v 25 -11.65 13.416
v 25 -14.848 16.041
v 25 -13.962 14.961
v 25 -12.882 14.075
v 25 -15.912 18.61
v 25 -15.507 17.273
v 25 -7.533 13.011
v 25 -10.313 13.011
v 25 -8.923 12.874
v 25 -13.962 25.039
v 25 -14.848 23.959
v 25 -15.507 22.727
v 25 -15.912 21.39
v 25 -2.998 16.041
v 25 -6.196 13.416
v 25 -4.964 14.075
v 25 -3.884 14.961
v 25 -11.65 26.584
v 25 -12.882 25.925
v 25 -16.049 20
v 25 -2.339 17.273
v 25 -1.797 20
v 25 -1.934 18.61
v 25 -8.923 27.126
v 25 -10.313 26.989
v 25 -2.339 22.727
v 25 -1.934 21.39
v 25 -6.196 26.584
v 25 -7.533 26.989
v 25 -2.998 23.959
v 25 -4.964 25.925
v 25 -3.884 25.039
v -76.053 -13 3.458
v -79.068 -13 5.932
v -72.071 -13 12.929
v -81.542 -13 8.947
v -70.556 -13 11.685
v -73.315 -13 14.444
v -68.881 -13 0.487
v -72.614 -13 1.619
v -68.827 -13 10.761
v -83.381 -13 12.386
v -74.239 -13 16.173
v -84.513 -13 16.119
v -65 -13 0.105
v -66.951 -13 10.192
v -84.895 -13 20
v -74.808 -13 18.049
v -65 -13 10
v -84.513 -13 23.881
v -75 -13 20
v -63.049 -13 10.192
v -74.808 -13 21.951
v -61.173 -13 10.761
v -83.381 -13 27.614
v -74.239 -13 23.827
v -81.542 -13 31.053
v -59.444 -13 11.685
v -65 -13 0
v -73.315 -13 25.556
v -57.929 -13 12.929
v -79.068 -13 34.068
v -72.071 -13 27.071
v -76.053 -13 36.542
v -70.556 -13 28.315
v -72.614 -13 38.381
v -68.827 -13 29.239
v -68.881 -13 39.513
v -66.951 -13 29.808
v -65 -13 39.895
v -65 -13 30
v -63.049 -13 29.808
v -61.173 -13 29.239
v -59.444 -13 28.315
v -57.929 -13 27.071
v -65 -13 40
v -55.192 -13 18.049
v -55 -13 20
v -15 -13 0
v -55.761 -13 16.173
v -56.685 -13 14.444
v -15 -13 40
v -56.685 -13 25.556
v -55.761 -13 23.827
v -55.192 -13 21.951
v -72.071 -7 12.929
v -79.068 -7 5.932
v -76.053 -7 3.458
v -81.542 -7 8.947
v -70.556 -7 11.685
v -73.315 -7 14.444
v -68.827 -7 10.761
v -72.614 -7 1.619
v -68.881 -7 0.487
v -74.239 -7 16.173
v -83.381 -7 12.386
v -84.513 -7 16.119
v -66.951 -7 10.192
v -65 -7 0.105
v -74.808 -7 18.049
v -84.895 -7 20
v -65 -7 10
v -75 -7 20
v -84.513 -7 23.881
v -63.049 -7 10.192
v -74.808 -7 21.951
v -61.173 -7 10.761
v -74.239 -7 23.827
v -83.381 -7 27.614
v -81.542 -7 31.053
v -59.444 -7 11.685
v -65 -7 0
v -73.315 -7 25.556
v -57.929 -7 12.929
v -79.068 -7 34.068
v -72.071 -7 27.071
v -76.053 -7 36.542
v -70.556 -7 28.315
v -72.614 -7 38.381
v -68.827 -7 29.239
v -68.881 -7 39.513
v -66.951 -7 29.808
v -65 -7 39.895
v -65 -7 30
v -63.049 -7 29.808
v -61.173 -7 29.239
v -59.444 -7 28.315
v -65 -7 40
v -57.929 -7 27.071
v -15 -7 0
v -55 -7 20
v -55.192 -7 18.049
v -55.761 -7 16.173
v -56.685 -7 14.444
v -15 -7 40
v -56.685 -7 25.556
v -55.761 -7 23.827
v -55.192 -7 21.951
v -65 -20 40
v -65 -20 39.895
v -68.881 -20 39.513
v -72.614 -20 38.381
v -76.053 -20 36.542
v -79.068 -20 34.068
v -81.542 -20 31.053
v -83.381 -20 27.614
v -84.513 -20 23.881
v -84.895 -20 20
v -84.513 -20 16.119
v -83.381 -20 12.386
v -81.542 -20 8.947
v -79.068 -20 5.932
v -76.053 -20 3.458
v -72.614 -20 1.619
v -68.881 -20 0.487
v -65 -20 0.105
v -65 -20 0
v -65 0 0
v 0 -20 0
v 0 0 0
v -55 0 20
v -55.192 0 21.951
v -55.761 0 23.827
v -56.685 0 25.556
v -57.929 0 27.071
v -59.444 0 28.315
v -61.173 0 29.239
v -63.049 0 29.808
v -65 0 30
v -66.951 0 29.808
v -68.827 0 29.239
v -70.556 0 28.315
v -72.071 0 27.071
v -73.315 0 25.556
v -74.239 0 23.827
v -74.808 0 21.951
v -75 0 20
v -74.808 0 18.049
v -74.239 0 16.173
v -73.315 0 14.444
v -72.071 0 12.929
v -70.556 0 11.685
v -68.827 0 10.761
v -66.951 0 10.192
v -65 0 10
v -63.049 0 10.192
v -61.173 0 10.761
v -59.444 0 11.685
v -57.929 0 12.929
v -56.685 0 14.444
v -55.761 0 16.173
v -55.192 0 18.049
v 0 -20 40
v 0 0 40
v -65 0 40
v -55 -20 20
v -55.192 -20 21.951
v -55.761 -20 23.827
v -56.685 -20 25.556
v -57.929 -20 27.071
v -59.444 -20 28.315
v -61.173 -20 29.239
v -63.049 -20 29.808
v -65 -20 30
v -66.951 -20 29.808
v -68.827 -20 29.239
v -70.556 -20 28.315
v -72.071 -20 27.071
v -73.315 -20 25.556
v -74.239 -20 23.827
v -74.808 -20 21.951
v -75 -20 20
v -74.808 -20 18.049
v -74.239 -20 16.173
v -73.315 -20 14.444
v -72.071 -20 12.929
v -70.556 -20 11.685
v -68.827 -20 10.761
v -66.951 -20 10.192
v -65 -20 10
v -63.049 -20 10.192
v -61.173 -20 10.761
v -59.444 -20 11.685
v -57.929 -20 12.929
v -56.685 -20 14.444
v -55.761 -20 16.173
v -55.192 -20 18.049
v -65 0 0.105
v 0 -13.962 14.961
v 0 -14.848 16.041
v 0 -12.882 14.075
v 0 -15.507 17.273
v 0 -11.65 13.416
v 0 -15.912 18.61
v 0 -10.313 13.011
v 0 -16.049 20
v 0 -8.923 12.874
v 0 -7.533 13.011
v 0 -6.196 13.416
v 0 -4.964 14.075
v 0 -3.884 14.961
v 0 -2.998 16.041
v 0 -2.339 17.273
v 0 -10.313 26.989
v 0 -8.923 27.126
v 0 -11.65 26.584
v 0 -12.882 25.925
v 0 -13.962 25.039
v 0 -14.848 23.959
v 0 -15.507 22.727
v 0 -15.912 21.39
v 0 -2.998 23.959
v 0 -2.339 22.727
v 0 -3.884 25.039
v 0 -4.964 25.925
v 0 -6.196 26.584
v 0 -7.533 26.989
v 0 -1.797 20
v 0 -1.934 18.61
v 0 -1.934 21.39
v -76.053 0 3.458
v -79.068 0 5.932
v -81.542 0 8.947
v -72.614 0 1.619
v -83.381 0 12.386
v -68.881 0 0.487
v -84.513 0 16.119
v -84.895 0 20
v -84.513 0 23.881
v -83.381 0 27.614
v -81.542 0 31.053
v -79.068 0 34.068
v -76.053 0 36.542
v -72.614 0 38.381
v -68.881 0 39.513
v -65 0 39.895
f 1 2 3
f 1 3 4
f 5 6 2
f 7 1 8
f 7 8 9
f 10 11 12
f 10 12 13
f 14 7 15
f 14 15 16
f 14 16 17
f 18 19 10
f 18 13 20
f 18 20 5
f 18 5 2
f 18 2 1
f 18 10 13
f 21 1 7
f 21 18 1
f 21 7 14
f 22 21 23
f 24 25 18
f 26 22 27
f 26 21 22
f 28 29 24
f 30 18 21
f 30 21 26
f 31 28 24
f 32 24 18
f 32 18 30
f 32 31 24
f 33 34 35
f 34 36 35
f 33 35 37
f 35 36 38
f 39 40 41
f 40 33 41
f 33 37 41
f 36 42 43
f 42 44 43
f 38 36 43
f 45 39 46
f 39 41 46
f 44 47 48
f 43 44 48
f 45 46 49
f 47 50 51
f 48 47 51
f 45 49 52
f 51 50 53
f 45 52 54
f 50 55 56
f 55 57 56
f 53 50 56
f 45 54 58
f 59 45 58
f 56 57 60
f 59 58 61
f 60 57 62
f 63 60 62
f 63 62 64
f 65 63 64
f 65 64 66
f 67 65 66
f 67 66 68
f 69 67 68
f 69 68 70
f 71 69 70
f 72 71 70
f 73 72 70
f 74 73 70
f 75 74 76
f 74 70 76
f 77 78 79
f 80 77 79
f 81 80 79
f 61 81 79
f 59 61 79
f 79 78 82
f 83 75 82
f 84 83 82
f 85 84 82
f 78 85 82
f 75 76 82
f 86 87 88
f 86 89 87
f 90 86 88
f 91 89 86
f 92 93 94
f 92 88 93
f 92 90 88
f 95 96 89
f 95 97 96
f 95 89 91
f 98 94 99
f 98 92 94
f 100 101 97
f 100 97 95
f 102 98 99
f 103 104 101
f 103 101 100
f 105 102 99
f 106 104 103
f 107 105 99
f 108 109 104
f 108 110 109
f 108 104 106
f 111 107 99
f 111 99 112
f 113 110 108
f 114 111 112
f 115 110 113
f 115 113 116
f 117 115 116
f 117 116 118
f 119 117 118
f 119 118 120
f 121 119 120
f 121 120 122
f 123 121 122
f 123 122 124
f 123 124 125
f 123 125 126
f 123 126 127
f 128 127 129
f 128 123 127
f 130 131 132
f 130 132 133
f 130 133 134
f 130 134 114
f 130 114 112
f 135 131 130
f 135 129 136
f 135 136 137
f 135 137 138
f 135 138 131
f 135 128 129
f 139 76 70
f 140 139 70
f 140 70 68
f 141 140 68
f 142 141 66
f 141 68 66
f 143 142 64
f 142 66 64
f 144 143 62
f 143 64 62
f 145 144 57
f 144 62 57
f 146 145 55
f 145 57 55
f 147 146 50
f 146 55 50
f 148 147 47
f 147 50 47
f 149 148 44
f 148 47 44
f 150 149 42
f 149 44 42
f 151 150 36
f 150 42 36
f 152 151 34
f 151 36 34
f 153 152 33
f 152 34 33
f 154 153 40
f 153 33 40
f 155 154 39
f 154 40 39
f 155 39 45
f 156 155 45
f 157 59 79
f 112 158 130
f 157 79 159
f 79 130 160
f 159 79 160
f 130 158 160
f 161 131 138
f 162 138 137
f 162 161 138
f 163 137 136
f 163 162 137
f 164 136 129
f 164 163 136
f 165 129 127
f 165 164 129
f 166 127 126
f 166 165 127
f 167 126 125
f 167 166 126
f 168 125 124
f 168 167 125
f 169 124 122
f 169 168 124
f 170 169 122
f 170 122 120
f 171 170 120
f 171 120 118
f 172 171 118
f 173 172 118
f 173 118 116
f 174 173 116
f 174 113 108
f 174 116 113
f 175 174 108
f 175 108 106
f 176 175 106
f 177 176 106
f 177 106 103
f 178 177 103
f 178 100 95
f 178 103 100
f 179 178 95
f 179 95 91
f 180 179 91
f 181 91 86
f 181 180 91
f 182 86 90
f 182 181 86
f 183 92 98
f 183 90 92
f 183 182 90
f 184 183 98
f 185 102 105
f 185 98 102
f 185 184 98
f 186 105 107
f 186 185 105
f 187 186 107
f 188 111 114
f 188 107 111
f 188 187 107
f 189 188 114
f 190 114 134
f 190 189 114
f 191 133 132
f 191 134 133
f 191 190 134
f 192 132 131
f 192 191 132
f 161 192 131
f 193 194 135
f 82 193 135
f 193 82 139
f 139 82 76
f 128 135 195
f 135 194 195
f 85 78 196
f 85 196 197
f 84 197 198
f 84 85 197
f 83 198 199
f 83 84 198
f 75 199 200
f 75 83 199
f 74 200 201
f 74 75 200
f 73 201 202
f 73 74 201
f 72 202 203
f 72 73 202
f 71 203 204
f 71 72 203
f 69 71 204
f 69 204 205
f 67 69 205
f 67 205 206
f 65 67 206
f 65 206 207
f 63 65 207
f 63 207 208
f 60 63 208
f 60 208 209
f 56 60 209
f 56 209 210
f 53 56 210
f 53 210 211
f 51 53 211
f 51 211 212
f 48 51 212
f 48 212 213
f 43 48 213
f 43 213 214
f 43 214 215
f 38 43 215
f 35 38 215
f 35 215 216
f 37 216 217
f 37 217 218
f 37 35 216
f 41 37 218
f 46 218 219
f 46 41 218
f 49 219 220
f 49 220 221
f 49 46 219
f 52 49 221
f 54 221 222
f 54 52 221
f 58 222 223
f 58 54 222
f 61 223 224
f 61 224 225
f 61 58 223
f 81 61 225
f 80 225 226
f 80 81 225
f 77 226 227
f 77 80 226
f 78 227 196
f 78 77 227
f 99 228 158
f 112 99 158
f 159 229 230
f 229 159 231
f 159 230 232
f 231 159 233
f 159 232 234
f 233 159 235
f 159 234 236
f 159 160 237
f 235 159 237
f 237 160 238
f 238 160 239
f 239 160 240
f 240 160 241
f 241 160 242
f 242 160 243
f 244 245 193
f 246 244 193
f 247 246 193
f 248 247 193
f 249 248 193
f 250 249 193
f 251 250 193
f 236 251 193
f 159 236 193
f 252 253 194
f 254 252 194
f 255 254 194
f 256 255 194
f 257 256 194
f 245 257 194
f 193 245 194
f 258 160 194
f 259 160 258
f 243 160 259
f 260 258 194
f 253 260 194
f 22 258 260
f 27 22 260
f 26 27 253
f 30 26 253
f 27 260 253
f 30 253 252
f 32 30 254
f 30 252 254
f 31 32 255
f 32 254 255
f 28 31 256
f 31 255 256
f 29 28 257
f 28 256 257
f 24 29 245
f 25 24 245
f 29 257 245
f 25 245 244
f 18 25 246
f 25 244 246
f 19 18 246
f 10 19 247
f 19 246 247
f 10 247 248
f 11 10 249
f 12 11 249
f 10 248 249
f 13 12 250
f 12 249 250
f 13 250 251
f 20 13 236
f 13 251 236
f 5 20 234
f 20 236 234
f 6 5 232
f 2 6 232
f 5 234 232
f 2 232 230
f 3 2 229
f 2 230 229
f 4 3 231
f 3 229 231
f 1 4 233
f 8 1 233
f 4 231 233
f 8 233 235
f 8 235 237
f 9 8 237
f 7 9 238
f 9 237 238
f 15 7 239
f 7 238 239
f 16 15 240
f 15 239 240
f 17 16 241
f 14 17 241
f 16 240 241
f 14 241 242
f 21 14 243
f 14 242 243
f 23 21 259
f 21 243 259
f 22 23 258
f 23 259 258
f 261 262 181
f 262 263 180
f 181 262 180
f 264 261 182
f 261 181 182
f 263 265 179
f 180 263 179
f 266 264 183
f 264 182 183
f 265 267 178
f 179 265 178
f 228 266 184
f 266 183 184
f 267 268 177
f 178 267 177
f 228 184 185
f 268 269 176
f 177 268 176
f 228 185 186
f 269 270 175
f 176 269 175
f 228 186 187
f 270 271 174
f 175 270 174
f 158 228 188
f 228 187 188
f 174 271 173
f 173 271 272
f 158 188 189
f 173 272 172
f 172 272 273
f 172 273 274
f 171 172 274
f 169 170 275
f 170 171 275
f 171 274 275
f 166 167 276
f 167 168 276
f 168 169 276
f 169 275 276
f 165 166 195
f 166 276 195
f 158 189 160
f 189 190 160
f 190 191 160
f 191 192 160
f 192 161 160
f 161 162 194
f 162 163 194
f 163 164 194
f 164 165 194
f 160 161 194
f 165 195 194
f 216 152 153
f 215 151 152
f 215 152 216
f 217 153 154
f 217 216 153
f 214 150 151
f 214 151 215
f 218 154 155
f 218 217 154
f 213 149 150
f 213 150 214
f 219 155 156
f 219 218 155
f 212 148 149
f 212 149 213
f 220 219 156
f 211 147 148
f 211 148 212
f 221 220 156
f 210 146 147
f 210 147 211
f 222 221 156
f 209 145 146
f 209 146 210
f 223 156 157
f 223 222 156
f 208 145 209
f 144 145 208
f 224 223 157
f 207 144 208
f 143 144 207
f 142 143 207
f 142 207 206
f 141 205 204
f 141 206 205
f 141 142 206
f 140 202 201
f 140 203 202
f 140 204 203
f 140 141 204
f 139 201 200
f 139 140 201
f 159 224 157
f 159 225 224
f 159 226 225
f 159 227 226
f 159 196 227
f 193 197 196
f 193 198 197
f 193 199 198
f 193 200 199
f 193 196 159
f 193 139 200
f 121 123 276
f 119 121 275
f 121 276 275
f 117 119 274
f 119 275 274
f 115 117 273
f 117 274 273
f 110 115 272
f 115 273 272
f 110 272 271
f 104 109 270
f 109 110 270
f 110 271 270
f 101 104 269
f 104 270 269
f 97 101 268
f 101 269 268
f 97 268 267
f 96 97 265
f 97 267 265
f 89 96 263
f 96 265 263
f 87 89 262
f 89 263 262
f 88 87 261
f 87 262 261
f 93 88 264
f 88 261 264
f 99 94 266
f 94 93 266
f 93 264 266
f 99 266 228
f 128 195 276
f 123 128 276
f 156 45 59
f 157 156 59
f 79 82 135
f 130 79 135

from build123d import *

# Parameters (mm, degrees)
F0_R     = 10
F1_DEPTH = 20
F2_W     = 74.504801
F2_H     = 6
F3_DEPTH = 40
F4_R     = 7.126224
F5_DEPTH = 25


with BuildPart() as f1:
    # F0 (on Front) → F1 (new body)
    with BuildSketch(Plane.XZ):
        with BuildLine():
            Line((-65, 0), (0, 0))
            Line((0, 0), (0, 40))
            Line((0, 40), (-65, 40))
            Line((-65, 40), (-65, 39.89539))
            ThreePointArc((-65, 39.89539), (-84.89539, 20), (-65, 0.10461))
            Line((-65, 0.10461), (-65, 0))
        make_face()
        with Locations((-65, 20)):
            Circle(F0_R, mode=Mode.SUBTRACT)
    extrude(amount=F1_DEPTH)

    # F2 (on face) → F3 (cut, through all)
    with BuildSketch(Plane.XY.offset(40)):
        with Locations((-52.252401, -10)):
            Rectangle(F2_W, F2_H)
    extrude(amount=-F3_DEPTH, mode=Mode.SUBTRACT)

    # F4 (on face) → F5 (join)
    with BuildSketch(Plane.YZ):
        with Locations((-8.923112, 20)):
            Circle(F4_R)
    extrude(amount=F5_DEPTH)


solid = f1.part
